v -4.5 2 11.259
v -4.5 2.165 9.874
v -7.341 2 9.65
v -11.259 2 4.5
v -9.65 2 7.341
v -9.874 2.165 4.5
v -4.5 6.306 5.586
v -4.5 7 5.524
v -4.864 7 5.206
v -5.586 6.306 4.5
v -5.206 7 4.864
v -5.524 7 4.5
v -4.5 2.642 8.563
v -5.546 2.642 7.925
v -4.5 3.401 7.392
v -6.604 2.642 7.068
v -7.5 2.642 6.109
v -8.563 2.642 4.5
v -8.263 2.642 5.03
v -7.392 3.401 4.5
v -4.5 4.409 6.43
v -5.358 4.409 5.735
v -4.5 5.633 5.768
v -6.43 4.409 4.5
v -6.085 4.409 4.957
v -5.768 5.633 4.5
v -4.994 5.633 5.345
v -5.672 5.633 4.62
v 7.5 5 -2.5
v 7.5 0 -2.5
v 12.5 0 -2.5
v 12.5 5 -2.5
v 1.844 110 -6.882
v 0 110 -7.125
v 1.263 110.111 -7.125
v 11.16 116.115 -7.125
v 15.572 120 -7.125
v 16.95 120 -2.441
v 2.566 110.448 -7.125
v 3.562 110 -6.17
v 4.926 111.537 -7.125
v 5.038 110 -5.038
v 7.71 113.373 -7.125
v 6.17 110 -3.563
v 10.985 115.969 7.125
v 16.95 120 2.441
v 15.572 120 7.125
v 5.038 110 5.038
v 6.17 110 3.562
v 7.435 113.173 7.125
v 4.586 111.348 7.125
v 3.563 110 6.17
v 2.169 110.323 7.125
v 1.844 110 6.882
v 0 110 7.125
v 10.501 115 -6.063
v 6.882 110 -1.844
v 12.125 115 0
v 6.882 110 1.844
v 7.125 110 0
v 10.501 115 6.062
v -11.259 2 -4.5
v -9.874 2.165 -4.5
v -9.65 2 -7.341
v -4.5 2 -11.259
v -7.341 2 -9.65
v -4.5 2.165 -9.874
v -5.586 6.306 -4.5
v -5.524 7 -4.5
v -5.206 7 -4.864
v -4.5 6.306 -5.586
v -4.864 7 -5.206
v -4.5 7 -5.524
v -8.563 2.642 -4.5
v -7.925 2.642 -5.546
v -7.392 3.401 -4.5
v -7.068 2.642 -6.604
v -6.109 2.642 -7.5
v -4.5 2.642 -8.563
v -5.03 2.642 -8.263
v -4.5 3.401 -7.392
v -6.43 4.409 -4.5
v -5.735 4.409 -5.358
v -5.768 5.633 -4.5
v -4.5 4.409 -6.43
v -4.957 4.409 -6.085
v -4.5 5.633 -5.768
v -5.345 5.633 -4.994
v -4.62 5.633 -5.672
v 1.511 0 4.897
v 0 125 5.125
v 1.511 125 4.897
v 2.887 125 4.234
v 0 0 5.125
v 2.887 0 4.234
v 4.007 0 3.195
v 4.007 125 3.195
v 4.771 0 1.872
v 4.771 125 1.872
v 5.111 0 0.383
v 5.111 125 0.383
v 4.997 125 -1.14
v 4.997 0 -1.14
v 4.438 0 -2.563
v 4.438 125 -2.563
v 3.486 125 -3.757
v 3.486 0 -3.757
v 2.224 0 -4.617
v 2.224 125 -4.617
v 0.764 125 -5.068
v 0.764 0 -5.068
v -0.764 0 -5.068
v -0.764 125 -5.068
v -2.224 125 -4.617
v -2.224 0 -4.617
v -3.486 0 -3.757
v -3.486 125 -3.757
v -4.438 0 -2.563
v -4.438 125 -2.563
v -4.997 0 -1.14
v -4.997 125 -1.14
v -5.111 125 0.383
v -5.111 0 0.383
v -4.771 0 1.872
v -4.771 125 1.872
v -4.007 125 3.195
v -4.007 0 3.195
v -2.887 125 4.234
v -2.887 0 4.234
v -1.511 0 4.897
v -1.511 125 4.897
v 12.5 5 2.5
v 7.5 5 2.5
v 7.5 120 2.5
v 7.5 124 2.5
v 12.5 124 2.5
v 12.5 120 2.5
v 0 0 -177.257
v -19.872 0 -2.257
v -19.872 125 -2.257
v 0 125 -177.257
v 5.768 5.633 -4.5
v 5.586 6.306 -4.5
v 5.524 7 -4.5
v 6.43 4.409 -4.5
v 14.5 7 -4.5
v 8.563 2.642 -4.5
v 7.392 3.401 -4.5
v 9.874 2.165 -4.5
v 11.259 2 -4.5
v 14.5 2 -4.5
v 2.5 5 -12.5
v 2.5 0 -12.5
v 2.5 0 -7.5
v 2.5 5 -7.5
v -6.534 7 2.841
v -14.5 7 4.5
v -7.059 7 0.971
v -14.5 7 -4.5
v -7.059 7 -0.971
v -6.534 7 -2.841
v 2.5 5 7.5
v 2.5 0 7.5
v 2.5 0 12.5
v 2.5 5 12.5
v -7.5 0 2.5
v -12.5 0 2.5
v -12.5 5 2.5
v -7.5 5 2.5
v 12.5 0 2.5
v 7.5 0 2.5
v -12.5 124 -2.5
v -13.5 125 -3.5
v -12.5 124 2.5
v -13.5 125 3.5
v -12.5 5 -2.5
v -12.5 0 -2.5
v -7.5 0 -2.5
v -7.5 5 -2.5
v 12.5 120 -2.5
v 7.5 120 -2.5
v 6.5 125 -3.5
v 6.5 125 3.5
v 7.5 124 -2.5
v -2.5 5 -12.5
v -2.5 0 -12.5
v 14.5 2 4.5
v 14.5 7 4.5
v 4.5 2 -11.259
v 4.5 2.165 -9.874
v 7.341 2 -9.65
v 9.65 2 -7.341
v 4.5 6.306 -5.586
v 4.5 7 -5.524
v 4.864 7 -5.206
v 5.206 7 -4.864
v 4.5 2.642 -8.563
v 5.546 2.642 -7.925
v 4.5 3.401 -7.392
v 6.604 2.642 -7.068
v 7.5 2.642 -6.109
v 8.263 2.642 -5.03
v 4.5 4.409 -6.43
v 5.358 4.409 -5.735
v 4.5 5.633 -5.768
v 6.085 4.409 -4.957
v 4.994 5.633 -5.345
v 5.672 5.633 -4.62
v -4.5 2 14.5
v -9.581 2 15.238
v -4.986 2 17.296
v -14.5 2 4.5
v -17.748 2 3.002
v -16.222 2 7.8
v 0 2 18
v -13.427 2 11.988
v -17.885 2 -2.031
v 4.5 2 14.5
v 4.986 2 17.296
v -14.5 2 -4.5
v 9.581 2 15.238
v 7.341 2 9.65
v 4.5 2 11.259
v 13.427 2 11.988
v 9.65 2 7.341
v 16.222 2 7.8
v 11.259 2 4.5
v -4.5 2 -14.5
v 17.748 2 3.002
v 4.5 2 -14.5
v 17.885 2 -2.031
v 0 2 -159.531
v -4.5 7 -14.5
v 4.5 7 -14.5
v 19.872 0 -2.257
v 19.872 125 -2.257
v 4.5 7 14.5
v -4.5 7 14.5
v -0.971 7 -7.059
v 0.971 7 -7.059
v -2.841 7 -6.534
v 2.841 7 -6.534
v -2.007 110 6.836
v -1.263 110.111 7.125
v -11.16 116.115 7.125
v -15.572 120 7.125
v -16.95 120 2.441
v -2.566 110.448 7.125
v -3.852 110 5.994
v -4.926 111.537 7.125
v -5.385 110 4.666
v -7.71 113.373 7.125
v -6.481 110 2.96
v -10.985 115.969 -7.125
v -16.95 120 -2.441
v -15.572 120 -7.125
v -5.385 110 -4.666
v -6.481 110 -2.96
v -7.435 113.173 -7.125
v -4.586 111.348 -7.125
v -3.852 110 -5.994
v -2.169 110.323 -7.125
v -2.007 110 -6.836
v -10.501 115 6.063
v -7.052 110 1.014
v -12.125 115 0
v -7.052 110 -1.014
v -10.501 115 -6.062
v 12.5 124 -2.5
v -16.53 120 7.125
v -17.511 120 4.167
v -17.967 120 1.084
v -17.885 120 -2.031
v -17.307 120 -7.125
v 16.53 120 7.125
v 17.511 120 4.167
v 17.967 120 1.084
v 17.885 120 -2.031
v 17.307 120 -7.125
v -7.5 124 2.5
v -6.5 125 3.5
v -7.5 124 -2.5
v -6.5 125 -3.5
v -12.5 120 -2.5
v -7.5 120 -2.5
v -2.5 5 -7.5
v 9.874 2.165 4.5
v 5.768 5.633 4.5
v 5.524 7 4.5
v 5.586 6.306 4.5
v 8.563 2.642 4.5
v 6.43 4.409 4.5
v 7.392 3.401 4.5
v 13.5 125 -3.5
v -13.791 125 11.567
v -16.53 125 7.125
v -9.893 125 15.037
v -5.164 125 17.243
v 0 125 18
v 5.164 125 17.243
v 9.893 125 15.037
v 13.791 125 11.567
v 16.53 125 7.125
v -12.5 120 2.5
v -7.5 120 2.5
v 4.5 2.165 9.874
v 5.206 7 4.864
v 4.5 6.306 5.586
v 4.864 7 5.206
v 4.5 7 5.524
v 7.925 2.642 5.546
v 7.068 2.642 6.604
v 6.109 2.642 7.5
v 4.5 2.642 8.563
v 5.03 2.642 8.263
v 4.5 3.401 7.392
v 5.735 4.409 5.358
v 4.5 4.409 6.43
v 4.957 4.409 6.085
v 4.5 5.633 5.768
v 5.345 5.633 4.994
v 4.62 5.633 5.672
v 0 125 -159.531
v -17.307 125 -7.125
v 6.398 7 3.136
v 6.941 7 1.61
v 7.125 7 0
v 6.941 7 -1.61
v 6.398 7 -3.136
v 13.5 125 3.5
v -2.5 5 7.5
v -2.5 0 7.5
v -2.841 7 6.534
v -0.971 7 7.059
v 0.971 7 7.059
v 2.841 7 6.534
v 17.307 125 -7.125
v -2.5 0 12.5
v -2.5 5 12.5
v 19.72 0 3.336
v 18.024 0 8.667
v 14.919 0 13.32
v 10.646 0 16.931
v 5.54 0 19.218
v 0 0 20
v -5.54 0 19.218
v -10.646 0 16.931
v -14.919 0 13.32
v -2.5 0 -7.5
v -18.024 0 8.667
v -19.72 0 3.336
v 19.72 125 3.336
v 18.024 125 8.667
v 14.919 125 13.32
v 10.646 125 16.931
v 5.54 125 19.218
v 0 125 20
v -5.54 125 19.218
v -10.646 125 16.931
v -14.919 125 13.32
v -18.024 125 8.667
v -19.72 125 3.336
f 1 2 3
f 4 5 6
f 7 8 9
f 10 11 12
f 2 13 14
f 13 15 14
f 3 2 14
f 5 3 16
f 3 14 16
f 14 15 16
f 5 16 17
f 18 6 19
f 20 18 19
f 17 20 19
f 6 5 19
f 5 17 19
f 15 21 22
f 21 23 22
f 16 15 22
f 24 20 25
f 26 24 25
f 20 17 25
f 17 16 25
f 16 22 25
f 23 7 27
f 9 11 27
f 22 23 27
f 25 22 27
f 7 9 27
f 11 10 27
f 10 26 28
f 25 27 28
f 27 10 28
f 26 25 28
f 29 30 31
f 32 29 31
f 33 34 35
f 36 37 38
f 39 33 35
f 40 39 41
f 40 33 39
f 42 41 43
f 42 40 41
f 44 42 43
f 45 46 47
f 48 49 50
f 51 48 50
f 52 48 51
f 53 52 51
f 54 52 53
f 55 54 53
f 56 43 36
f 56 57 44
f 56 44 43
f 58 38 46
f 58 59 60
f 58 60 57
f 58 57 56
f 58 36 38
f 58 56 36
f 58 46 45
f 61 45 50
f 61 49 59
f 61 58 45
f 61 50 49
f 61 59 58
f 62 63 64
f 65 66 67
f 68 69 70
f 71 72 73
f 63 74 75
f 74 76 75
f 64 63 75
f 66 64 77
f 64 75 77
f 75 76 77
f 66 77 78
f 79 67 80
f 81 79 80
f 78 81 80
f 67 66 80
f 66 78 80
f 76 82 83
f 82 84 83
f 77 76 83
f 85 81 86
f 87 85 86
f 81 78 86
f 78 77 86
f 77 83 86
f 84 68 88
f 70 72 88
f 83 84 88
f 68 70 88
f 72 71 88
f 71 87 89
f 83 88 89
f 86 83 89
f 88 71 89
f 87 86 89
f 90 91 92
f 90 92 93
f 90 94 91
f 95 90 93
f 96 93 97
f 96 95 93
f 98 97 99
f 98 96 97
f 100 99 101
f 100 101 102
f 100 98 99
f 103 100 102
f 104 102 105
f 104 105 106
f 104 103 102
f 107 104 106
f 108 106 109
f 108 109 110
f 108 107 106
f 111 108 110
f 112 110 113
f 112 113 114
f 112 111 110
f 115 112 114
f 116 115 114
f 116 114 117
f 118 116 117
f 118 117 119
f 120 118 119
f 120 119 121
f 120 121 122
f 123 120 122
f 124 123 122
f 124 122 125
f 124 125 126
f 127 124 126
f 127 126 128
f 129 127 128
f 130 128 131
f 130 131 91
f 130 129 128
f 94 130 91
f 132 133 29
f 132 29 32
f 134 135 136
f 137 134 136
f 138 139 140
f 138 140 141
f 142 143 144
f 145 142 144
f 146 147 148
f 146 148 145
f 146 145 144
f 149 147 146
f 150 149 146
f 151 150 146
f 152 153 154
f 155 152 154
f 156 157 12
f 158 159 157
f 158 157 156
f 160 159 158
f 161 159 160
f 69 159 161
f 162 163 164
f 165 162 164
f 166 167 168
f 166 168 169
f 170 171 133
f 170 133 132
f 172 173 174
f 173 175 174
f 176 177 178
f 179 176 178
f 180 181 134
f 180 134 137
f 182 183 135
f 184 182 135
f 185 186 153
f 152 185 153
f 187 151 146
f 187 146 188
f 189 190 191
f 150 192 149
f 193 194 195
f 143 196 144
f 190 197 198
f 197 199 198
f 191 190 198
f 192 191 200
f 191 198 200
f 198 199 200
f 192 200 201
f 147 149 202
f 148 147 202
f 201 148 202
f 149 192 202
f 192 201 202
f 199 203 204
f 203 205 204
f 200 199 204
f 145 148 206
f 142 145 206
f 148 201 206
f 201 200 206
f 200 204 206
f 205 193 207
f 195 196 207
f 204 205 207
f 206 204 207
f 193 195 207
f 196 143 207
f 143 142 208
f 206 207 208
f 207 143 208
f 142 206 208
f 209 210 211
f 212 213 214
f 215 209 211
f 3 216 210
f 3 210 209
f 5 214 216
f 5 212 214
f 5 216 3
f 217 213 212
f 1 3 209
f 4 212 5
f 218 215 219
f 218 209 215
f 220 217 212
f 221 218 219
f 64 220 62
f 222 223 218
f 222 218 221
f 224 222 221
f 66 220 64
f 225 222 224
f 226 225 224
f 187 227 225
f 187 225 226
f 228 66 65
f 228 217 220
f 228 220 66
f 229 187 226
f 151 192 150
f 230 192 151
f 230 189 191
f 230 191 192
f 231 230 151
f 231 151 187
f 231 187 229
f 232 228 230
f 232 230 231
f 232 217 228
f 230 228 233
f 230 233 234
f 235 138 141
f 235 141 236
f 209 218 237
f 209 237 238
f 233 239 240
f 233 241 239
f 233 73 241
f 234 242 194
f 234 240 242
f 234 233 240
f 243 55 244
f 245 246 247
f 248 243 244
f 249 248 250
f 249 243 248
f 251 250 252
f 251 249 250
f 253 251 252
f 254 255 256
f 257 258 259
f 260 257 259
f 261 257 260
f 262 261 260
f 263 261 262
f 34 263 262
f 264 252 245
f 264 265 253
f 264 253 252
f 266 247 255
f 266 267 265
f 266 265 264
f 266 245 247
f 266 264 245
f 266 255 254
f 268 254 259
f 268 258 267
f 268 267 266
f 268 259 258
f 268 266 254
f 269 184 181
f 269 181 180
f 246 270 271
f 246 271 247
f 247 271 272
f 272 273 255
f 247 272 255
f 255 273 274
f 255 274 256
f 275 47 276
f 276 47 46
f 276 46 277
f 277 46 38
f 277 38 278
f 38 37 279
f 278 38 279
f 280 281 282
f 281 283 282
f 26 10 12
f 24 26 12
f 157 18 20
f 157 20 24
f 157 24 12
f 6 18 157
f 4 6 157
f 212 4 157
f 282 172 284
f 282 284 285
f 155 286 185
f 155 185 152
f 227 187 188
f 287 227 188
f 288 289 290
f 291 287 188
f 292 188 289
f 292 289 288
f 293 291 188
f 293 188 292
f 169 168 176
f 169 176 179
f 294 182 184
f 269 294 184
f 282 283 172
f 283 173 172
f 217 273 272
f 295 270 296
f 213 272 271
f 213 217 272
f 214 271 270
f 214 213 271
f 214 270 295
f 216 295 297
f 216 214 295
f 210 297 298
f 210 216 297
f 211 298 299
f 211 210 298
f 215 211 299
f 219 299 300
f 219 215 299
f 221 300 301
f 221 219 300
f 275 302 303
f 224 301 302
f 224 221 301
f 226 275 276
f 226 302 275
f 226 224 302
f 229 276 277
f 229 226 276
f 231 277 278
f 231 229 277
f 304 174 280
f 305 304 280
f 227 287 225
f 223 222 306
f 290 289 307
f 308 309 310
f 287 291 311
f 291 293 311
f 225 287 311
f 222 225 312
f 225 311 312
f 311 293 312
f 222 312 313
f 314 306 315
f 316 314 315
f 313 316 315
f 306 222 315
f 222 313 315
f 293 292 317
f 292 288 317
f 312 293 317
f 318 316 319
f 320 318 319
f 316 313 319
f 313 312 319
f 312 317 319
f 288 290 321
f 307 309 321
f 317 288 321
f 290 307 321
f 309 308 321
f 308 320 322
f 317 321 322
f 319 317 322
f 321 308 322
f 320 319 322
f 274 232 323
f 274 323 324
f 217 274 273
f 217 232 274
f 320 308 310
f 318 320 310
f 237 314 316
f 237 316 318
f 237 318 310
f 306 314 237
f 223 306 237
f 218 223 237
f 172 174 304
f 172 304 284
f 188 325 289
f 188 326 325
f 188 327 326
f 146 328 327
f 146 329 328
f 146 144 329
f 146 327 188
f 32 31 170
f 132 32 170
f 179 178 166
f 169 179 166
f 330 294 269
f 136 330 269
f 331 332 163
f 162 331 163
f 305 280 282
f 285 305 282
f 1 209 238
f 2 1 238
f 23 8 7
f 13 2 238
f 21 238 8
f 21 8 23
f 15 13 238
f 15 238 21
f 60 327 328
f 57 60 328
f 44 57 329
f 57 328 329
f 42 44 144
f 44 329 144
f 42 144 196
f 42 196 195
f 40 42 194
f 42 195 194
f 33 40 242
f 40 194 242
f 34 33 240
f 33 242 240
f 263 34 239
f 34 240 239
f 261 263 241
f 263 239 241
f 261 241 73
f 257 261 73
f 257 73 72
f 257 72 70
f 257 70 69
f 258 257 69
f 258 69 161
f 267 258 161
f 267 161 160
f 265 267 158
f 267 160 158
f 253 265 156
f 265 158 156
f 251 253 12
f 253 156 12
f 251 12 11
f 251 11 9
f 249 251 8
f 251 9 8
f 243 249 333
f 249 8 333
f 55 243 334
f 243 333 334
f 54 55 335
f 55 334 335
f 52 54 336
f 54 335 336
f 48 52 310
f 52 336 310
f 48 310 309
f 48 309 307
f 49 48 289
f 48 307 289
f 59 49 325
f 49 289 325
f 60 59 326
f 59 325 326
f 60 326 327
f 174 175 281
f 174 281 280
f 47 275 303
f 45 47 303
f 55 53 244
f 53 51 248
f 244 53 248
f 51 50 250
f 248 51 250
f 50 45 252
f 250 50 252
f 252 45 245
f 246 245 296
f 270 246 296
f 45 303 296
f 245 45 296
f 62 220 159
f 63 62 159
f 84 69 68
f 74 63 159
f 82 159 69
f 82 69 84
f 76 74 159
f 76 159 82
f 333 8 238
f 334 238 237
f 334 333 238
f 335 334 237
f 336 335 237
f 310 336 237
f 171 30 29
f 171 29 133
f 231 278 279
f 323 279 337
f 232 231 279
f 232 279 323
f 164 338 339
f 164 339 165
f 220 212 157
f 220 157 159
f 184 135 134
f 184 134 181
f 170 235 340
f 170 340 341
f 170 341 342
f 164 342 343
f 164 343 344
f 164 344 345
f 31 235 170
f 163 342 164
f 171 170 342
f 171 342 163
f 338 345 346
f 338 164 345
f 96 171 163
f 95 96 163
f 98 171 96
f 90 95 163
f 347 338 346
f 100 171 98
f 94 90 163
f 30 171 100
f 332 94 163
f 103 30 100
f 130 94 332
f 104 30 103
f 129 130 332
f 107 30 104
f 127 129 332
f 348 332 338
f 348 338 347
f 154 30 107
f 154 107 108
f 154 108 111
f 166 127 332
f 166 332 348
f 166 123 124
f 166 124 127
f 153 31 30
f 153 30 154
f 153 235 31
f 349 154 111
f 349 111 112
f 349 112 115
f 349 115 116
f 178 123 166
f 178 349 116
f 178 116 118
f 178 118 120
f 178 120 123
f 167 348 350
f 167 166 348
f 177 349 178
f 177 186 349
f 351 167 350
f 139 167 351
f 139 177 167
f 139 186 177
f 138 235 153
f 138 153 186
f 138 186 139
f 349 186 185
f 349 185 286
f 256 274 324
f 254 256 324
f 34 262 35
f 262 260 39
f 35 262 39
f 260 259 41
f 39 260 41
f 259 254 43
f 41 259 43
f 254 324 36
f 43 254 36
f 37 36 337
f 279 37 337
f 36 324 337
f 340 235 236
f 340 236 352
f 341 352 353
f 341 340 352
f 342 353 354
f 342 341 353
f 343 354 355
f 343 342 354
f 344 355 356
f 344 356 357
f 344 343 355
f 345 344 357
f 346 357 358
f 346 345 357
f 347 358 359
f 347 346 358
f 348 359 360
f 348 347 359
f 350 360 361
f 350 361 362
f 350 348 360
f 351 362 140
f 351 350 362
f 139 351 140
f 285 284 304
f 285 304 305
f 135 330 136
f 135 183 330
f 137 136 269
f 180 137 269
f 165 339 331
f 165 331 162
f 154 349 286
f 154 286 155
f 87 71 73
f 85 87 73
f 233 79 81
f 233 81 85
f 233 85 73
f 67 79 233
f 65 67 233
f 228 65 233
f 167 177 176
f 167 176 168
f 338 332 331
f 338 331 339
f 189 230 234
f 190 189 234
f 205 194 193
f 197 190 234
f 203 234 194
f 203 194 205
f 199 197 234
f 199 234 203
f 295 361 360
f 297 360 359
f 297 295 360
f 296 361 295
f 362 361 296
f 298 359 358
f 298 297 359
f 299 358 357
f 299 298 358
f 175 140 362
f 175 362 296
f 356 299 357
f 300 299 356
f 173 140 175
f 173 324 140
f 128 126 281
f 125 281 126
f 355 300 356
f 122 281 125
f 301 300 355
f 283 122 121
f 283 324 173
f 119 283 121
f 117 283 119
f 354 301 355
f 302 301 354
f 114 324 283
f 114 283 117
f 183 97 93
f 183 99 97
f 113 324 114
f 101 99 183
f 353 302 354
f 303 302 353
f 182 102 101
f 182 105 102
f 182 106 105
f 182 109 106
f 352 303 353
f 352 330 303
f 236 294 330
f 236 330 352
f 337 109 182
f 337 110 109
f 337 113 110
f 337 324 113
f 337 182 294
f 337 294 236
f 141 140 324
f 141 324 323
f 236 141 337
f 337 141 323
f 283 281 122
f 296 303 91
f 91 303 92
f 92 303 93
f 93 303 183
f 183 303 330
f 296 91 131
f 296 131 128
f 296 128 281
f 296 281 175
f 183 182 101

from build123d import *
from build123d.topology import SkipClean

# Parameters (mm, degrees)
SKETCH1_R           = 5.125
BOSS_EXTRUDE1_DEPTH = 125
SKETCH2_W           = 5
SKETCH2_H           = 5
CUT_EXTRUDE1_DEPTH  = 5
SHELL1_START        = 7
SHELL1_OUTLINE_R    = 7.125
SHELL1_DEPTH        = 118
SHELL1_START_2      = 2
SHELL1_2_DEPTH      = 5
FILLET1_R           = 5
BOSS_EXTRUDE2_START = -5
SKETCH3_R           = 5.125
BOSS_EXTRUDE2_DEPTH = 5
CHAMFER1_SIZE       = 10
SKETCH5_W           = 5
SKETCH5_H           = 5
CUT_EXTRUDE3_DEPTH  = 5
CHAMFER2_SIZE       = 1


# Read off the part's stored shape, not the designer's step: Shell1
# Some blends are built 0.0001 mm under size
with BuildPart() as part:
    # Sketch1 → Boss-Extrude1 (new body)
    with BuildSketch(Plane(origin=(0, 0, 0), x_dir=(1, 0, 0), z_dir=(0, 1, 0))):
        with BuildLine():
            Line((-19.872284, 2.256615), (0, 177.256615))
            Line((0, 177.256615), (19.872284, 2.256615))
            ThreePointArc((19.872284, 2.256615), (0, -20), (-19.872284, 2.256615))
        make_face()
        with Locations(Location((0, 0, 0), (0, 0, 270))):
            Circle(SKETCH1_R, mode=Mode.SUBTRACT)
    extrude(amount=BOSS_EXTRUDE1_DEPTH)

    # Sketch2 → Cut-Extrude1 (cut)
    with BuildSketch(Plane.XZ):
        with Locations((10, 0)):
            Rectangle(SKETCH2_W, SKETCH2_H)
        with Locations((0, 10)):
            Rectangle(SKETCH2_W, SKETCH2_H)
        with Locations((0, -10)):
            Rectangle(SKETCH2_W, SKETCH2_H)
        with Locations((-10, 0)):
            Rectangle(SKETCH2_W, SKETCH2_H)
    extrude(amount=-CUT_EXTRUDE1_DEPTH, mode=Mode.SUBTRACT)

    # Shell1 outline → Shell1 (cut)
    with BuildSketch(Plane(origin=(0, 0, 0), x_dir=(1, 0, 0), z_dir=(0, 1, 0)).offset(SHELL1_START)):
        with BuildLine():
            ThreePointArc((-17.885056, 2.030954), (0, -18), (17.885056, 2.030954))
            Line((17.885056, 2.030954), (0, 159.530954))
            Line((0, 159.530954), (-17.885056, 2.030954))
        make_face()
        Circle(SHELL1_OUTLINE_R, mode=Mode.SUBTRACT)
    extrude(amount=SHELL1_DEPTH, mode=Mode.SUBTRACT)

    # Shell1 2 outline → Shell1 2 (cut)
    with SkipClean():  # the faces are left unmerged after this step: merging them gives an invalid solid
        with BuildSketch(Plane(origin=(0, 0, 0), x_dir=(1, 0, 0), z_dir=(0, 1, 0)).offset(SHELL1_START_2)):
            with BuildLine():
                ThreePointArc((-17.885056, 2.030954), (0, -18), (17.885056, 2.030954))
                Line((17.885056, 2.030954), (0, 159.530954))
                Line((0, 159.530954), (-17.885056, 2.030954))
            make_face()
            with BuildLine():
                ThreePointArc((4.5, 5.524095), (5.038136, 5.038136), (5.524095, 4.5))
                Line((5.524095, 4.5), (14.5, 4.5))
                Line((14.5, 4.5), (14.5, -4.5))
                Line((14.5, -4.5), (5.524095, -4.5))
                ThreePointArc((5.524095, -4.5), (5.038136, -5.038136), (4.5, -5.524095))
                Line((4.5, -5.524095), (4.5, -14.5))
                Line((4.5, -14.5), (-4.5, -14.5))
                Line((-4.5, -14.5), (-4.5, -5.524095))
                ThreePointArc((-4.5, -5.524095), (-5.038136, -5.038136), (-5.524095, -4.5))
                Line((-5.524095, -4.5), (-14.5, -4.5))
                Line((-14.5, -4.5), (-14.5, 4.5))
                Line((-14.5, 4.5), (-5.524095, 4.5))
                ThreePointArc((-5.524095, 4.5), (-5.038136, 5.038136), (-4.5, 5.524095))
                Line((-4.5, 5.524095), (-4.5, 14.5))
                Line((-4.5, 14.5), (4.5, 14.5))
                Line((4.5, 14.5), (4.5, 5.524095))
            make_face(mode=Mode.SUBTRACT)
        extrude(amount=SHELL1_2_DEPTH, mode=Mode.SUBTRACT)

    # Fillet1
    fillet1_edges = [part.edges().sort_by_distance(p)[0] for p in [
        (5.038136, 2, 5.038136),
        (-5.038136, 2, 5.038136),
        (-5.038136, 2, -5.038136),
        (5.038136, 2, -5.038136),
    ]]
    fillet(fillet1_edges, radius=FILLET1_R - 0.0001)  # a hair under: the kernel refuses the full size

    # Sketch3 → Boss-Extrude2 (add)
    with SkipClean():  # the faces are left unmerged after this step: merging them gives an invalid solid
        with BuildSketch(Plane(origin=(0, 125, 0), x_dir=(1, 0, 0), z_dir=(0, 1, 0)).offset(BOSS_EXTRUDE2_START)):
            with BuildLine():
                Line((-16.529803, -7.125), (16.529803, -7.125))
                ThreePointArc((16.529803, -7.125), (17.805996, -2.635622), (17.885056, 2.030954))
                Line((17.885056, 2.030954), (17.306597, 7.125))
                Line((17.306597, 7.125), (-17.306597, 7.125))
                Line((-17.306597, 7.125), (-17.885056, 2.030954))
                ThreePointArc((-17.885056, 2.030954), (-17.805996, -2.635622), (-16.529803, -7.125))
            make_face()
            with Locations(Location((0, 0, 0), (0, 0, 270))):
                Circle(SKETCH3_R, mode=Mode.SUBTRACT)
        extrude(amount=BOSS_EXTRUDE2_DEPTH)

    # Chamfer1
    # the kernel refuses this chamfer: 10 mm, written as the material it adds along each edge
    with BuildSketch(Plane(origin=(0, 120, 0), x_dir=(1, 0, 0), z_dir=(0, 0, -1))) as chamfer1_piece_1_section:
        Polygon((7.125 + CHAMFER1_SIZE, 0), (7.125, CHAMFER1_SIZE), (7.125, 0), align=None)
    chamfer1_piece_1 = revolve(axis=Axis((0, 120, 0), (0, -1, 0)), revolution_arc=90, mode=Mode.PRIVATE)
    chamfer1_piece_1 = split(chamfer1_piece_1, bisect_by=Plane(origin=(9.148116, 116.581472, 7.125), z_dir=(0, 0, -1)), keep=Keep.TOP, mode=Mode.PRIVATE)
    add(chamfer1_piece_1)
    with BuildSketch(Plane(origin=(0, 120, 0), x_dir=(0, 0, 1), z_dir=(1, 0, 0))) as chamfer1_piece_2_section:
        Polygon((7.125 + CHAMFER1_SIZE, 0), (7.125, CHAMFER1_SIZE), (7.125, 0), align=None)
    chamfer1_piece_2 = revolve(axis=Axis((0, 120, 0), (0, -1, 0)), revolution_arc=180, mode=Mode.PRIVATE)
    chamfer1_piece_2 = split(chamfer1_piece_2, bisect_by=Plane(origin=(-9.148116, 116.581472, 7.125), z_dir=(0, 0, -1)), keep=Keep.TOP, mode=Mode.PRIVATE)
    chamfer1_piece_2 = split(chamfer1_piece_2, bisect_by=Plane(origin=(-9.148116, 116.581472, -7.125), z_dir=(0, 0, 1)), keep=Keep.TOP, mode=Mode.PRIVATE)
    add(chamfer1_piece_2)
    with BuildSketch(Plane(origin=(0, 120, 0), x_dir=(0, 0, -1), z_dir=(-1, 0, 0))) as chamfer1_piece_3_section:
        Polygon((7.125 + CHAMFER1_SIZE, 0), (7.125, CHAMFER1_SIZE), (7.125, 0), align=None)
    chamfer1_piece_3 = revolve(axis=Axis((0, 120, 0), (0, -1, 0)), revolution_arc=90, mode=Mode.PRIVATE)
    chamfer1_piece_3 = split(chamfer1_piece_3, bisect_by=Plane(origin=(9.148116, 116.581472, -7.125), z_dir=(0, 0, 1)), keep=Keep.TOP, mode=Mode.PRIVATE)
    add(chamfer1_piece_3)

    # Sketch5 → Cut-Extrude3 (cut)
    with BuildSketch(Plane(origin=(0, 125, 0), x_dir=(1, 0, 0), z_dir=(0, 1, 0))):
        with Locations((10, 0)):
            Rectangle(SKETCH5_W, SKETCH5_H)
        with Locations((-10, 0)):
            Rectangle(SKETCH5_W, SKETCH5_H)
    extrude(amount=-CUT_EXTRUDE3_DEPTH, mode=Mode.SUBTRACT)

    # Chamfer2
    # the kernel refuses this chamfer: 1 mm, written as the material it takes off along each edge
    with BuildSketch(Plane(origin=(-7.5, 125, -2.5), x_dir=(0.999621916911297, 0.027495876610582174, 0), z_dir=(0, 0, 1)), Plane(origin=(-12.5, 125, -2.5), x_dir=(0, 0.02749587661058217, -0.9996219169112968), z_dir=(1, 0, 0)), Plane(origin=(-12.5, 125, 2.5), x_dir=(-0.999621916911297, 0.0274958766105822, 0), z_dir=(0, 0, -1)), Plane(origin=(-7.5, 125, 2.5), x_dir=(0, 0.02749587661058217, 0.9996219169112968), z_dir=(-1, 0, 0))) as chamfer2_piece_1:
        Polygon((CHAMFER2_SIZE * 0.999621916911, -CHAMFER2_SIZE * 0.0274958766106), (-CHAMFER2_SIZE * 0.0274958766106, -CHAMFER2_SIZE * 0.999621916911), (0, 0), align=None)
    extrude(amount=5, mode=Mode.SUBTRACT)
    with BuildSketch(Plane(origin=(12.5, 125, -2.5), x_dir=(0, 0.02749587661058217, -0.9996219169112968), z_dir=(-1, 0, 0)), Plane(origin=(7.5, 125, -2.5), x_dir=(-0.999621916911297, 0.027495876610582174, 0), z_dir=(0, 0, 1)), Plane(origin=(7.5, 125, 2.5), x_dir=(0, 0.02749587661058217, 0.9996219169112968), z_dir=(1, 0, 0)), Plane(origin=(12.5, 125, 2.5), x_dir=(0.999621916911297, 0.0274958766105822, 0), z_dir=(0, 0, -1))) as chamfer2_piece_2:
        Polygon((CHAMFER2_SIZE * 0.999621916911, CHAMFER2_SIZE * 0.0274958766106), (-CHAMFER2_SIZE * 0.0274958766106, CHAMFER2_SIZE * 0.999621916911), (0, 0), align=None)
    extrude(amount=5, mode=Mode.SUBTRACT)
    with BuildSketch(Plane(origin=(-7.5, 125, -5.071683), x_dir=(0.999621916911297, 0.027495876610582174, 0), z_dir=(0, 0, 1))) as chamfer2_piece_3a_section:
        Polygon((CHAMFER2_SIZE * 0.999621916911, -CHAMFER2_SIZE * 0.0274958766106), (-CHAMFER2_SIZE * 0.0274958766106, -CHAMFER2_SIZE * 0.999621916911), (0, 0), align=None)
    chamfer2_piece_3a = extrude(amount=7.571683, mode=Mode.PRIVATE)
    chamfer2_piece_3a = split(chamfer2_piece_3a, bisect_by=Plane(origin=(-7.170206, 124.670206, -2.5), z_dir=(0, 0, -1)), keep=Keep.TOP, mode=Mode.PRIVATE)
    with BuildSketch(Plane(origin=(-12.5, 125, -2.5), x_dir=(0, 0.02749587661058217, -0.9996219169112968), z_dir=(1, 0, 0))) as chamfer2_piece_3b_section:
        Polygon((CHAMFER2_SIZE * 0.999621916911, -CHAMFER2_SIZE * 0.0274958766106), (-CHAMFER2_SIZE * 0.0274958766106, -CHAMFER2_SIZE * 0.999621916911), (0, 0), align=None)
    chamfer2_piece_3b = extrude(amount=7.571683, mode=Mode.PRIVATE)
    chamfer2_piece_3b = split(chamfer2_piece_3b, bisect_by=Plane(origin=(-7.5, 124.670206, -2.829794), z_dir=(1, 0, 0)), keep=Keep.TOP, mode=Mode.PRIVATE)
    chamfer2_piece_3 = chamfer2_piece_3a & chamfer2_piece_3b
    add(chamfer2_piece_3, mode=Mode.SUBTRACT)
    with BuildSketch(Plane(origin=(-4.928317, 125, 2.5), x_dir=(0, 0.02749587661058217, 0.9996219169112968), z_dir=(-1, 0, 0))) as chamfer2_piece_4a_section:
        Polygon((CHAMFER2_SIZE * 0.999621916911, -CHAMFER2_SIZE * 0.0274958766106), (-CHAMFER2_SIZE * 0.0274958766106, -CHAMFER2_SIZE * 0.999621916911), (0, 0), align=None)
    chamfer2_piece_4a = extrude(amount=7.571683, mode=Mode.PRIVATE)
    chamfer2_piece_4a = split(chamfer2_piece_4a, bisect_by=Plane(origin=(-7.5, 124.670206, 2.829794), z_dir=(1, 0, 0)), keep=Keep.TOP, mode=Mode.PRIVATE)
    with BuildSketch(Plane(origin=(-7.5, 125, -2.5), x_dir=(0.999621916911297, 0.027495876610582174, 0), z_dir=(0, 0, 1))) as chamfer2_piece_4b_section:
        Polygon((CHAMFER2_SIZE * 0.999621916911, -CHAMFER2_SIZE * 0.0274958766106), (-CHAMFER2_SIZE * 0.0274958766106, -CHAMFER2_SIZE * 0.999621916911), (0, 0), align=None)
    chamfer2_piece_4b = extrude(amount=7.571683, mode=Mode.PRIVATE)
    chamfer2_piece_4b = split(chamfer2_piece_4b, bisect_by=Plane(origin=(-7.170206, 124.670206, 2.5), z_dir=(0, 0, 1)), keep=Keep.TOP, mode=Mode.PRIVATE)
    chamfer2_piece_4 = chamfer2_piece_4a & chamfer2_piece_4b
    add(chamfer2_piece_4, mode=Mode.SUBTRACT)
    with BuildSketch(Plane(origin=(-12.5, 125, 2.5), x_dir=(-0.999621916911297, 0.0274958766105822, 0), z_dir=(0, 0, -1))) as chamfer2_piece_5a_section:
        Polygon((CHAMFER2_SIZE * 0.999621916911, -CHAMFER2_SIZE * 0.0274958766106), (-CHAMFER2_SIZE * 0.0274958766106, -CHAMFER2_SIZE * 0.999621916911), (0, 0), align=None)
    chamfer2_piece_5a = extrude(amount=7.571683, mode=Mode.PRIVATE)
    chamfer2_piece_5a = split(chamfer2_piece_5a, bisect_by=Plane(origin=(-12.829794, 124.670206, -2.5), z_dir=(0, 0, -1)), keep=Keep.TOP, mode=Mode.PRIVATE)
    with BuildSketch(Plane(origin=(-15.071683, 125, -2.5), x_dir=(0, 0.02749587661058217, -0.9996219169112968), z_dir=(1, 0, 0))) as chamfer2_piece_5b_section:
        Polygon((CHAMFER2_SIZE * 0.999621916911, -CHAMFER2_SIZE * 0.0274958766106), (-CHAMFER2_SIZE * 0.0274958766106, -CHAMFER2_SIZE * 0.999621916911), (0, 0), align=None)
    chamfer2_piece_5b = extrude(amount=7.571683, mode=Mode.PRIVATE)
    chamfer2_piece_5b = split(chamfer2_piece_5b, bisect_by=Plane(origin=(-12.5, 124.670206, -2.829794), z_dir=(-1, 0, 0)), keep=Keep.TOP, mode=Mode.PRIVATE)
    chamfer2_piece_5 = chamfer2_piece_5a & chamfer2_piece_5b
    add(chamfer2_piece_5, mode=Mode.SUBTRACT)
    with BuildSketch(Plane(origin=(-12.5, 125, 5.071683), x_dir=(-0.999621916911297, 0.0274958766105822, 0), z_dir=(0, 0, -1))) as chamfer2_piece_6a_section:
        Polygon((CHAMFER2_SIZE * 0.999621916911, -CHAMFER2_SIZE * 0.0274958766106), (-CHAMFER2_SIZE * 0.0274958766106, -CHAMFER2_SIZE * 0.999621916911), (0, 0), align=None)
    chamfer2_piece_6a = extrude(amount=7.571683, mode=Mode.PRIVATE)
    chamfer2_piece_6a = split(chamfer2_piece_6a, bisect_by=Plane(origin=(-12.829794, 124.670206, 2.5), z_dir=(0, 0, 1)), keep=Keep.TOP, mode=Mode.PRIVATE)
    with BuildSketch(Plane(origin=(-7.5, 125, 2.5), x_dir=(0, 0.02749587661058217, 0.9996219169112968), z_dir=(-1, 0, 0))) as chamfer2_piece_6b_section:
        Polygon((CHAMFER2_SIZE * 0.999621916911, -CHAMFER2_SIZE * 0.0274958766106), (-CHAMFER2_SIZE * 0.0274958766106, -CHAMFER2_SIZE * 0.999621916911), (0, 0), align=None)
    chamfer2_piece_6b = extrude(amount=7.571683, mode=Mode.PRIVATE)
    chamfer2_piece_6b = split(chamfer2_piece_6b, bisect_by=Plane(origin=(-12.5, 124.670206, 2.829794), z_dir=(-1, 0, 0)), keep=Keep.TOP, mode=Mode.PRIVATE)
    chamfer2_piece_6 = chamfer2_piece_6a & chamfer2_piece_6b
    add(chamfer2_piece_6, mode=Mode.SUBTRACT)
    with BuildSketch(Plane(origin=(12.5, 125, 2.5), x_dir=(0.999621916911297, 0.0274958766105822, 0), z_dir=(0, 0, -1))) as chamfer2_piece_7a_section:
        Polygon((CHAMFER2_SIZE * 0.999621916911, CHAMFER2_SIZE * 0.0274958766106), (-CHAMFER2_SIZE * 0.0274958766106, CHAMFER2_SIZE * 0.999621916911), (0, 0), align=None)
    chamfer2_piece_7a = extrude(amount=7.571683, mode=Mode.PRIVATE)
    chamfer2_piece_7a = split(chamfer2_piece_7a, bisect_by=Plane(origin=(12.829794, 124.670206, -2.5), z_dir=(0, 0, -1)), keep=Keep.TOP, mode=Mode.PRIVATE)
    with BuildSketch(Plane(origin=(15.071683, 125, -2.5), x_dir=(0, 0.02749587661058217, -0.9996219169112968), z_dir=(-1, 0, 0))) as chamfer2_piece_7b_section:
        Polygon((CHAMFER2_SIZE * 0.999621916911, CHAMFER2_SIZE * 0.0274958766106), (-CHAMFER2_SIZE * 0.0274958766106, CHAMFER2_SIZE * 0.999621916911), (0, 0), align=None)
    chamfer2_piece_7b = extrude(amount=7.571683, mode=Mode.PRIVATE)
    chamfer2_piece_7b = split(chamfer2_piece_7b, bisect_by=Plane(origin=(12.5, 124.670206, -2.829794), z_dir=(1, 0, 0)), keep=Keep.TOP, mode=Mode.PRIVATE)
    chamfer2_piece_7 = chamfer2_piece_7a & chamfer2_piece_7b
    add(chamfer2_piece_7, mode=Mode.SUBTRACT)
    with BuildSketch(Plane(origin=(12.5, 125, -2.5), x_dir=(0, 0.02749587661058217, -0.9996219169112968), z_dir=(-1, 0, 0))) as chamfer2_piece_8a_section:
        Polygon((CHAMFER2_SIZE * 0.999621916911, CHAMFER2_SIZE * 0.0274958766106), (-CHAMFER2_SIZE * 0.0274958766106, CHAMFER2_SIZE * 0.999621916911), (0, 0), align=None)
    chamfer2_piece_8a = extrude(amount=7.571683, mode=Mode.PRIVATE)
    chamfer2_piece_8a = split(chamfer2_piece_8a, bisect_by=Plane(origin=(7.5, 124.670206, -2.829794), z_dir=(-1, 0, 0)), keep=Keep.TOP, mode=Mode.PRIVATE)
    with BuildSketch(Plane(origin=(7.5, 125, -5.071683), x_dir=(-0.999621916911297, 0.027495876610582174, 0), z_dir=(0, 0, 1))) as chamfer2_piece_8b_section:
        Polygon((CHAMFER2_SIZE * 0.999621916911, CHAMFER2_SIZE * 0.0274958766106), (-CHAMFER2_SIZE * 0.0274958766106, CHAMFER2_SIZE * 0.999621916911), (0, 0), align=None)
    chamfer2_piece_8b = extrude(amount=7.571683, mode=Mode.PRIVATE)
    chamfer2_piece_8b = split(chamfer2_piece_8b, bisect_by=Plane(origin=(7.170206, 124.670206, -2.5), z_dir=(0, 0, -1)), keep=Keep.TOP, mode=Mode.PRIVATE)
    chamfer2_piece_8 = chamfer2_piece_8a & chamfer2_piece_8b
    add(chamfer2_piece_8, mode=Mode.SUBTRACT)
    with BuildSketch(Plane(origin=(7.5, 125, -2.5), x_dir=(-0.999621916911297, 0.027495876610582174, 0), z_dir=(0, 0, 1))) as chamfer2_piece_9a_section:
        Polygon((CHAMFER2_SIZE * 0.999621916911, CHAMFER2_SIZE * 0.0274958766106), (-CHAMFER2_SIZE * 0.0274958766106, CHAMFER2_SIZE * 0.999621916911), (0, 0), align=None)
    chamfer2_piece_9a = extrude(amount=7.571683, mode=Mode.PRIVATE)
    chamfer2_piece_9a = split(chamfer2_piece_9a, bisect_by=Plane(origin=(7.170206, 124.670206, 2.5), z_dir=(0, 0, 1)), keep=Keep.TOP, mode=Mode.PRIVATE)
    with BuildSketch(Plane(origin=(4.928317, 125, 2.5), x_dir=(0, 0.02749587661058217, 0.9996219169112968), z_dir=(1, 0, 0))) as chamfer2_piece_9b_section:
        Polygon((CHAMFER2_SIZE * 0.999621916911, CHAMFER2_SIZE * 0.0274958766106), (-CHAMFER2_SIZE * 0.0274958766106, CHAMFER2_SIZE * 0.999621916911), (0, 0), align=None)
    chamfer2_piece_9b = extrude(amount=7.571683, mode=Mode.PRIVATE)
    chamfer2_piece_9b = split(chamfer2_piece_9b, bisect_by=Plane(origin=(7.5, 124.670206, 2.829794), z_dir=(-1, 0, 0)), keep=Keep.TOP, mode=Mode.PRIVATE)
    chamfer2_piece_9 = chamfer2_piece_9a & chamfer2_piece_9b
    add(chamfer2_piece_9, mode=Mode.SUBTRACT)
    with BuildSketch(Plane(origin=(12.5, 125, 5.071683), x_dir=(0.999621916911297, 0.0274958766105822, 0), z_dir=(0, 0, -1))) as chamfer2_piece_10a_section:
        Polygon((CHAMFER2_SIZE * 0.999621916911, CHAMFER2_SIZE * 0.0274958766106), (-CHAMFER2_SIZE * 0.0274958766106, CHAMFER2_SIZE * 0.999621916911), (0, 0), align=None)
    chamfer2_piece_10a = extrude(amount=7.571683, mode=Mode.PRIVATE)
    chamfer2_piece_10a = split(chamfer2_piece_10a, bisect_by=Plane(origin=(12.829794, 124.670206, 2.5), z_dir=(0, 0, 1)), keep=Keep.TOP, mode=Mode.PRIVATE)
    with BuildSketch(Plane(origin=(7.5, 125, 2.5), x_dir=(0, 0.02749587661058217, 0.9996219169112968), z_dir=(1, 0, 0))) as chamfer2_piece_10b_section:
        Polygon((CHAMFER2_SIZE * 0.999621916911, CHAMFER2_SIZE * 0.0274958766106), (-CHAMFER2_SIZE * 0.0274958766106, CHAMFER2_SIZE * 0.999621916911), (0, 0), align=None)
    chamfer2_piece_10b = extrude(amount=7.571683, mode=Mode.PRIVATE)
    chamfer2_piece_10b = split(chamfer2_piece_10b, bisect_by=Plane(origin=(12.5, 124.670206, 2.829794), z_dir=(1, 0, 0)), keep=Keep.TOP, mode=Mode.PRIVATE)
    chamfer2_piece_10 = chamfer2_piece_10a & chamfer2_piece_10b
    add(chamfer2_piece_10, mode=Mode.SUBTRACT)


solid = part.part
